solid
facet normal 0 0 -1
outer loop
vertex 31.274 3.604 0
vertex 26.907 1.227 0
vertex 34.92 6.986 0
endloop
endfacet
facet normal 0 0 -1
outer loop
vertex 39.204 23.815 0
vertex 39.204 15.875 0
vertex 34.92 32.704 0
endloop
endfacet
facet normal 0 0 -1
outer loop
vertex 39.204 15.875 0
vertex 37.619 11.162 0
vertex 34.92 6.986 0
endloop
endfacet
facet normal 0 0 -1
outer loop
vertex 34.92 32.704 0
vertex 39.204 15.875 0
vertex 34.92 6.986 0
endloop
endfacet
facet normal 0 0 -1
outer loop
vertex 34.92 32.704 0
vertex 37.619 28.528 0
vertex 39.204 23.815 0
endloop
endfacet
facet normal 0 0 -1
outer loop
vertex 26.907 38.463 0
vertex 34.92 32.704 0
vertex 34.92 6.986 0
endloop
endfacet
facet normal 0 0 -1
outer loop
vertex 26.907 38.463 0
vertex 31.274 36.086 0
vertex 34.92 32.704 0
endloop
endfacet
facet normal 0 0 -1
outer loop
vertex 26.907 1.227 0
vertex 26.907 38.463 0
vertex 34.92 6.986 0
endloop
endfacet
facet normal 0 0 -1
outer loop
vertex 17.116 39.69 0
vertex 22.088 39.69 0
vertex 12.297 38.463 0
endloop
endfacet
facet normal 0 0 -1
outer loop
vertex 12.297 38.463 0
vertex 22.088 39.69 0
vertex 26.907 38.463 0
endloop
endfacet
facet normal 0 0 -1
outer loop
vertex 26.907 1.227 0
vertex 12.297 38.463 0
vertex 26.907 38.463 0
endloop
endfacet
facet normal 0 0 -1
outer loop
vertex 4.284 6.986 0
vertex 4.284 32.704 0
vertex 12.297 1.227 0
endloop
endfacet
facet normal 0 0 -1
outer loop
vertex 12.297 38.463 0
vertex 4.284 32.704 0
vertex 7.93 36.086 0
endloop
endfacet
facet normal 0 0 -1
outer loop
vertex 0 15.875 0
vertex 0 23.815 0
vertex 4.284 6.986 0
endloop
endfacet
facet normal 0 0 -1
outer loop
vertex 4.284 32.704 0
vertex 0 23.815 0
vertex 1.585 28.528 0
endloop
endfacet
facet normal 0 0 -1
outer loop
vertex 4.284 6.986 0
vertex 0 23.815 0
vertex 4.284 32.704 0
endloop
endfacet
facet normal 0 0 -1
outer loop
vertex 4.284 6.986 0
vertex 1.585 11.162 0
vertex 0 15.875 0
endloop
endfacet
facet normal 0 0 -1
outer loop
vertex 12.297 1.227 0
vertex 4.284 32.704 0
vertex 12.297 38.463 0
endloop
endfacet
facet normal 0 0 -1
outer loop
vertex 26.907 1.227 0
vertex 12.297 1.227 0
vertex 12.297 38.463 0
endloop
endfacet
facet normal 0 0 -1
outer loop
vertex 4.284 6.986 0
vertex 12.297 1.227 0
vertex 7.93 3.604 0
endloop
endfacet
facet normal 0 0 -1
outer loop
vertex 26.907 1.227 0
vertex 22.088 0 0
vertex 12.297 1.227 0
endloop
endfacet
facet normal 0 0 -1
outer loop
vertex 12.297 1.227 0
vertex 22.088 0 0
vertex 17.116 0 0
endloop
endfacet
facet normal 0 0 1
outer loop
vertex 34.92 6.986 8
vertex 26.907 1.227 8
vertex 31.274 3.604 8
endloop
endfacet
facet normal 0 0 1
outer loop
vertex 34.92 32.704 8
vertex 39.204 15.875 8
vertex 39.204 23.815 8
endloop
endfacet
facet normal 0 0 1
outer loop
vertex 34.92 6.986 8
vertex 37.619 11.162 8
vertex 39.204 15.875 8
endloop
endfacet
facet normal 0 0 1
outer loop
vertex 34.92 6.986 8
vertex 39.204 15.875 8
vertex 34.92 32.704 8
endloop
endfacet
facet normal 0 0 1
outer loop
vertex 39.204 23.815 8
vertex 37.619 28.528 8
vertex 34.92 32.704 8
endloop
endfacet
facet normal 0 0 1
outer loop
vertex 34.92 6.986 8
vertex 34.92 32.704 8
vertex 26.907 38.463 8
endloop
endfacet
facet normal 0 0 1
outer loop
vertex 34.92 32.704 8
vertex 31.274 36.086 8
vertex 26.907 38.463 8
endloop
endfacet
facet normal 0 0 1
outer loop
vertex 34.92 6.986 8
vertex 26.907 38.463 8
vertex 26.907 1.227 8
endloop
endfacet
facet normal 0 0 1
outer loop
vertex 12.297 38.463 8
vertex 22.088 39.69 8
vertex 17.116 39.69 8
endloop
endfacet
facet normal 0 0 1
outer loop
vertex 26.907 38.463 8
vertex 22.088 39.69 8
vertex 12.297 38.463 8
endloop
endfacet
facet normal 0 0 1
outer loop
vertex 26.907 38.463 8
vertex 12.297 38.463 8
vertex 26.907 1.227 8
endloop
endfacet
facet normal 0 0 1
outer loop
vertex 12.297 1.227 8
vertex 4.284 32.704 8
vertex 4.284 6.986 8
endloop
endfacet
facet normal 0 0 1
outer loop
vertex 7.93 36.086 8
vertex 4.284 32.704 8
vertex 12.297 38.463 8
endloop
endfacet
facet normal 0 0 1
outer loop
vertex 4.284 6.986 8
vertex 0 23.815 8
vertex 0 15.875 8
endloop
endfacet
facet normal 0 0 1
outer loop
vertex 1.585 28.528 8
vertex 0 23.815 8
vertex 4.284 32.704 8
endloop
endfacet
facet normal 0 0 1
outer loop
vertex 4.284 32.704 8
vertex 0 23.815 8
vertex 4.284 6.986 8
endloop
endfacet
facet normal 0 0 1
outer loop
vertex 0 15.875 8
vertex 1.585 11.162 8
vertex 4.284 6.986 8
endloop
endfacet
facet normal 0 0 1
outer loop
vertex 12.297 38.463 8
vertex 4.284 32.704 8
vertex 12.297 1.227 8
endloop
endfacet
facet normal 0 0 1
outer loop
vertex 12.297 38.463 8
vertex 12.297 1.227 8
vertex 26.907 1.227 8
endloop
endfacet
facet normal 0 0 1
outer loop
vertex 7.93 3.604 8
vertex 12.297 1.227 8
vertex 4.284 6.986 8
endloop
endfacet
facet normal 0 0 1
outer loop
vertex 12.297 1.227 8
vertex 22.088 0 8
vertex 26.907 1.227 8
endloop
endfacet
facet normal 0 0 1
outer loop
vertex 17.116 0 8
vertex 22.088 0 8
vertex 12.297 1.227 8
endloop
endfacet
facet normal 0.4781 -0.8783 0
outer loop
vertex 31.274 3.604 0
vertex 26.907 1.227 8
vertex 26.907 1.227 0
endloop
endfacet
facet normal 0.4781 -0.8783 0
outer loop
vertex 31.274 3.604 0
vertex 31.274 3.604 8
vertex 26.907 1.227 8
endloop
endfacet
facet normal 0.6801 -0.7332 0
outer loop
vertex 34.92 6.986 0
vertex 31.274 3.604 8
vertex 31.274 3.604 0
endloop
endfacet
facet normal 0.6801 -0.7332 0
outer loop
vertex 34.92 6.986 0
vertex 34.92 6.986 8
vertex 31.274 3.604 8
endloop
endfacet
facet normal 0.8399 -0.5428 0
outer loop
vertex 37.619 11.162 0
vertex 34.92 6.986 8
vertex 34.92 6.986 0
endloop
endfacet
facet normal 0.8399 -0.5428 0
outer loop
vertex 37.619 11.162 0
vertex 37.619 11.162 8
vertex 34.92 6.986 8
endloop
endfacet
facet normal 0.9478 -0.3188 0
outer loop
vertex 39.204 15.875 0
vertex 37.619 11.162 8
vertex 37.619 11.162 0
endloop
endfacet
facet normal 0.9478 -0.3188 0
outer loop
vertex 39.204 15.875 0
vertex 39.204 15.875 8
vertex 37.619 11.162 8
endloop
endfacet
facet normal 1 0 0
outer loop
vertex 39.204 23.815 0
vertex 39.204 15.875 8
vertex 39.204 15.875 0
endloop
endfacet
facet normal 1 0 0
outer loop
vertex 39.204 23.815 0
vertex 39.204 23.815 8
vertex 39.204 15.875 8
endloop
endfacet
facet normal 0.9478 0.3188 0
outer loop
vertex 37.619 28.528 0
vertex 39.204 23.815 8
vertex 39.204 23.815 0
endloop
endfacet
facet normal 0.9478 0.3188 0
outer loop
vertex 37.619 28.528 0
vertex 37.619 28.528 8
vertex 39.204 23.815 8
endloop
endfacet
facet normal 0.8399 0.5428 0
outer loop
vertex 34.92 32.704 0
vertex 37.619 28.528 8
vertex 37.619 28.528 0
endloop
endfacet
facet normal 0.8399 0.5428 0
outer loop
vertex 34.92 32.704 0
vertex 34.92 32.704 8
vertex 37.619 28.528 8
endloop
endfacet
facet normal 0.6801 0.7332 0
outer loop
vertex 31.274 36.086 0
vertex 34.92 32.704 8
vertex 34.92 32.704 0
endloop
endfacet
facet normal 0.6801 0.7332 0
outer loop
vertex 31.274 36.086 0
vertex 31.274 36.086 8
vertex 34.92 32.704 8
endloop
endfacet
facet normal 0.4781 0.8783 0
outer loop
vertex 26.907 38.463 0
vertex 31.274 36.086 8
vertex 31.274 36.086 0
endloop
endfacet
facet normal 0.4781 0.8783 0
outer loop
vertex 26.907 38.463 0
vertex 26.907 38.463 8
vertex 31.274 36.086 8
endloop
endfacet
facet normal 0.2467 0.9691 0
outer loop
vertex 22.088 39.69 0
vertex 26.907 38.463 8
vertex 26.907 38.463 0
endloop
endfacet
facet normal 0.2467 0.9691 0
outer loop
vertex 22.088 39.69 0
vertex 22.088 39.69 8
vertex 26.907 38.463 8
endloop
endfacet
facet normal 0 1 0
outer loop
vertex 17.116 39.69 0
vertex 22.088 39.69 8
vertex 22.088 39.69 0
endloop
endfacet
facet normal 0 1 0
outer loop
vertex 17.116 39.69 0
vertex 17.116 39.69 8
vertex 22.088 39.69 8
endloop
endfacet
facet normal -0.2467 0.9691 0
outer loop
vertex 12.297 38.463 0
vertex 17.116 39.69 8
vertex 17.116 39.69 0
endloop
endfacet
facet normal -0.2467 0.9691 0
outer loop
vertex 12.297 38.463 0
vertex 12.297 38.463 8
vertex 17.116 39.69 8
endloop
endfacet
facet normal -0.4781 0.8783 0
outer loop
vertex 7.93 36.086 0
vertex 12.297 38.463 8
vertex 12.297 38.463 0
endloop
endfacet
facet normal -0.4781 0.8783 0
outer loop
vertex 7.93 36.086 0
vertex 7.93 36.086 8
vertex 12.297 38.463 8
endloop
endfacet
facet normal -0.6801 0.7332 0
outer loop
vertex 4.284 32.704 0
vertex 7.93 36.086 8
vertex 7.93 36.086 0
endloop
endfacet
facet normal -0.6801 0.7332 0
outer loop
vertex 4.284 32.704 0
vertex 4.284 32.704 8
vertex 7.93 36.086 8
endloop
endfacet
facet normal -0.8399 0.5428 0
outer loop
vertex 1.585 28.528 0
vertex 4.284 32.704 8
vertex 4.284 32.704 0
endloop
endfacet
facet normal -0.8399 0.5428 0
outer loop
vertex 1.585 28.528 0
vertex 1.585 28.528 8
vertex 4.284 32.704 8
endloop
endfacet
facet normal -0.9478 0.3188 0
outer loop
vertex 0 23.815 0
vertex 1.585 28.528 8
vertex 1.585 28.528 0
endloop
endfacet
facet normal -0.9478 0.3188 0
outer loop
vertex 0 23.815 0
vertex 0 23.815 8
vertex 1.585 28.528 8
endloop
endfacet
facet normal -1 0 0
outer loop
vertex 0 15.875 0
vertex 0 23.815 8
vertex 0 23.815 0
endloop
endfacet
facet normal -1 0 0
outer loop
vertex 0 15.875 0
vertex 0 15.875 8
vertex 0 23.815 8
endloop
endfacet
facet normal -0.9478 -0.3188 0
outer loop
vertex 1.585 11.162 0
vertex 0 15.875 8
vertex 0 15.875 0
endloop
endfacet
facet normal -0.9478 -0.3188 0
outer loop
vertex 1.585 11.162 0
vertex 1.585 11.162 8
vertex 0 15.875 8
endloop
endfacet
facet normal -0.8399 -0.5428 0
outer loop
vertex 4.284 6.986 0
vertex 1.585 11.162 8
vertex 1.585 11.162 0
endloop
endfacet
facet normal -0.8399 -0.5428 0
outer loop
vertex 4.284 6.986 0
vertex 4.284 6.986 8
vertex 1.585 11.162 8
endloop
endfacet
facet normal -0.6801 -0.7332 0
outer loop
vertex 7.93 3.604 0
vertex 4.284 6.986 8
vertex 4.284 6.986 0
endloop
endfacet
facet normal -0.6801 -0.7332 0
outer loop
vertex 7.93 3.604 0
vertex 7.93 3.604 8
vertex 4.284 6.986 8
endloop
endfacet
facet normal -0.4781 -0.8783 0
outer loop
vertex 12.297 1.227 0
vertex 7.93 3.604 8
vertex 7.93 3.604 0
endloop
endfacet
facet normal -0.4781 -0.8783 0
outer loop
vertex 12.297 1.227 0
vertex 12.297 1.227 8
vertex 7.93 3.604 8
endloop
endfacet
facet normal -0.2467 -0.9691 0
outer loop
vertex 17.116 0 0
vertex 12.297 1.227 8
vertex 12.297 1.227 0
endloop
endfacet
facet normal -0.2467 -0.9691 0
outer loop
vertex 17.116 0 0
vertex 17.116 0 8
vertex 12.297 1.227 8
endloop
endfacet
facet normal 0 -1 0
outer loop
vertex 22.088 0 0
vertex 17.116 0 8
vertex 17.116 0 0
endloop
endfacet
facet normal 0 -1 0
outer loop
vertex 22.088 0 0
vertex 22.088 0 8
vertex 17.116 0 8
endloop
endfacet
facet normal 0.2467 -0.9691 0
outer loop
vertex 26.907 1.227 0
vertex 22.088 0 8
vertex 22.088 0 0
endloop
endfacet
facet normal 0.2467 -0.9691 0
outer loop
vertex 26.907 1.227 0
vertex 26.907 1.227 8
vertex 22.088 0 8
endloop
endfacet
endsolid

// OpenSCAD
$fn = 32;

// ----------------------------------------------------------------------
// Flat adaptor: double_d, 8 mm thick
// ----------------------------------------------------------------------

// --- parameters (mm) ---
profile_height = 8;       // extrusion height
profile_points = 24;      // points of the closed outline

profile = [[39.204, 23.815], [37.619, 28.528], [34.92, 32.704], [31.274, 36.086], [26.907, 38.463], [22.088, 39.69], [17.116, 39.69], [12.297, 38.463], [7.93, 36.086], [4.284, 32.704], [1.585, 28.528], [0, 23.815], [0, 15.875], [1.585, 11.162], [4.284, 6.986], [7.93, 3.604], [12.297, 1.227], [17.116, 0], [22.088, 0], [26.907, 1.227], [31.274, 3.604], [34.92, 6.986], [37.619, 11.162], [39.204, 15.875]];  // single closed polygon, 24 points, counter clockwise

// --- the one profile operation ---
linear_extrude(height = profile_height) polygon(points = profile);
